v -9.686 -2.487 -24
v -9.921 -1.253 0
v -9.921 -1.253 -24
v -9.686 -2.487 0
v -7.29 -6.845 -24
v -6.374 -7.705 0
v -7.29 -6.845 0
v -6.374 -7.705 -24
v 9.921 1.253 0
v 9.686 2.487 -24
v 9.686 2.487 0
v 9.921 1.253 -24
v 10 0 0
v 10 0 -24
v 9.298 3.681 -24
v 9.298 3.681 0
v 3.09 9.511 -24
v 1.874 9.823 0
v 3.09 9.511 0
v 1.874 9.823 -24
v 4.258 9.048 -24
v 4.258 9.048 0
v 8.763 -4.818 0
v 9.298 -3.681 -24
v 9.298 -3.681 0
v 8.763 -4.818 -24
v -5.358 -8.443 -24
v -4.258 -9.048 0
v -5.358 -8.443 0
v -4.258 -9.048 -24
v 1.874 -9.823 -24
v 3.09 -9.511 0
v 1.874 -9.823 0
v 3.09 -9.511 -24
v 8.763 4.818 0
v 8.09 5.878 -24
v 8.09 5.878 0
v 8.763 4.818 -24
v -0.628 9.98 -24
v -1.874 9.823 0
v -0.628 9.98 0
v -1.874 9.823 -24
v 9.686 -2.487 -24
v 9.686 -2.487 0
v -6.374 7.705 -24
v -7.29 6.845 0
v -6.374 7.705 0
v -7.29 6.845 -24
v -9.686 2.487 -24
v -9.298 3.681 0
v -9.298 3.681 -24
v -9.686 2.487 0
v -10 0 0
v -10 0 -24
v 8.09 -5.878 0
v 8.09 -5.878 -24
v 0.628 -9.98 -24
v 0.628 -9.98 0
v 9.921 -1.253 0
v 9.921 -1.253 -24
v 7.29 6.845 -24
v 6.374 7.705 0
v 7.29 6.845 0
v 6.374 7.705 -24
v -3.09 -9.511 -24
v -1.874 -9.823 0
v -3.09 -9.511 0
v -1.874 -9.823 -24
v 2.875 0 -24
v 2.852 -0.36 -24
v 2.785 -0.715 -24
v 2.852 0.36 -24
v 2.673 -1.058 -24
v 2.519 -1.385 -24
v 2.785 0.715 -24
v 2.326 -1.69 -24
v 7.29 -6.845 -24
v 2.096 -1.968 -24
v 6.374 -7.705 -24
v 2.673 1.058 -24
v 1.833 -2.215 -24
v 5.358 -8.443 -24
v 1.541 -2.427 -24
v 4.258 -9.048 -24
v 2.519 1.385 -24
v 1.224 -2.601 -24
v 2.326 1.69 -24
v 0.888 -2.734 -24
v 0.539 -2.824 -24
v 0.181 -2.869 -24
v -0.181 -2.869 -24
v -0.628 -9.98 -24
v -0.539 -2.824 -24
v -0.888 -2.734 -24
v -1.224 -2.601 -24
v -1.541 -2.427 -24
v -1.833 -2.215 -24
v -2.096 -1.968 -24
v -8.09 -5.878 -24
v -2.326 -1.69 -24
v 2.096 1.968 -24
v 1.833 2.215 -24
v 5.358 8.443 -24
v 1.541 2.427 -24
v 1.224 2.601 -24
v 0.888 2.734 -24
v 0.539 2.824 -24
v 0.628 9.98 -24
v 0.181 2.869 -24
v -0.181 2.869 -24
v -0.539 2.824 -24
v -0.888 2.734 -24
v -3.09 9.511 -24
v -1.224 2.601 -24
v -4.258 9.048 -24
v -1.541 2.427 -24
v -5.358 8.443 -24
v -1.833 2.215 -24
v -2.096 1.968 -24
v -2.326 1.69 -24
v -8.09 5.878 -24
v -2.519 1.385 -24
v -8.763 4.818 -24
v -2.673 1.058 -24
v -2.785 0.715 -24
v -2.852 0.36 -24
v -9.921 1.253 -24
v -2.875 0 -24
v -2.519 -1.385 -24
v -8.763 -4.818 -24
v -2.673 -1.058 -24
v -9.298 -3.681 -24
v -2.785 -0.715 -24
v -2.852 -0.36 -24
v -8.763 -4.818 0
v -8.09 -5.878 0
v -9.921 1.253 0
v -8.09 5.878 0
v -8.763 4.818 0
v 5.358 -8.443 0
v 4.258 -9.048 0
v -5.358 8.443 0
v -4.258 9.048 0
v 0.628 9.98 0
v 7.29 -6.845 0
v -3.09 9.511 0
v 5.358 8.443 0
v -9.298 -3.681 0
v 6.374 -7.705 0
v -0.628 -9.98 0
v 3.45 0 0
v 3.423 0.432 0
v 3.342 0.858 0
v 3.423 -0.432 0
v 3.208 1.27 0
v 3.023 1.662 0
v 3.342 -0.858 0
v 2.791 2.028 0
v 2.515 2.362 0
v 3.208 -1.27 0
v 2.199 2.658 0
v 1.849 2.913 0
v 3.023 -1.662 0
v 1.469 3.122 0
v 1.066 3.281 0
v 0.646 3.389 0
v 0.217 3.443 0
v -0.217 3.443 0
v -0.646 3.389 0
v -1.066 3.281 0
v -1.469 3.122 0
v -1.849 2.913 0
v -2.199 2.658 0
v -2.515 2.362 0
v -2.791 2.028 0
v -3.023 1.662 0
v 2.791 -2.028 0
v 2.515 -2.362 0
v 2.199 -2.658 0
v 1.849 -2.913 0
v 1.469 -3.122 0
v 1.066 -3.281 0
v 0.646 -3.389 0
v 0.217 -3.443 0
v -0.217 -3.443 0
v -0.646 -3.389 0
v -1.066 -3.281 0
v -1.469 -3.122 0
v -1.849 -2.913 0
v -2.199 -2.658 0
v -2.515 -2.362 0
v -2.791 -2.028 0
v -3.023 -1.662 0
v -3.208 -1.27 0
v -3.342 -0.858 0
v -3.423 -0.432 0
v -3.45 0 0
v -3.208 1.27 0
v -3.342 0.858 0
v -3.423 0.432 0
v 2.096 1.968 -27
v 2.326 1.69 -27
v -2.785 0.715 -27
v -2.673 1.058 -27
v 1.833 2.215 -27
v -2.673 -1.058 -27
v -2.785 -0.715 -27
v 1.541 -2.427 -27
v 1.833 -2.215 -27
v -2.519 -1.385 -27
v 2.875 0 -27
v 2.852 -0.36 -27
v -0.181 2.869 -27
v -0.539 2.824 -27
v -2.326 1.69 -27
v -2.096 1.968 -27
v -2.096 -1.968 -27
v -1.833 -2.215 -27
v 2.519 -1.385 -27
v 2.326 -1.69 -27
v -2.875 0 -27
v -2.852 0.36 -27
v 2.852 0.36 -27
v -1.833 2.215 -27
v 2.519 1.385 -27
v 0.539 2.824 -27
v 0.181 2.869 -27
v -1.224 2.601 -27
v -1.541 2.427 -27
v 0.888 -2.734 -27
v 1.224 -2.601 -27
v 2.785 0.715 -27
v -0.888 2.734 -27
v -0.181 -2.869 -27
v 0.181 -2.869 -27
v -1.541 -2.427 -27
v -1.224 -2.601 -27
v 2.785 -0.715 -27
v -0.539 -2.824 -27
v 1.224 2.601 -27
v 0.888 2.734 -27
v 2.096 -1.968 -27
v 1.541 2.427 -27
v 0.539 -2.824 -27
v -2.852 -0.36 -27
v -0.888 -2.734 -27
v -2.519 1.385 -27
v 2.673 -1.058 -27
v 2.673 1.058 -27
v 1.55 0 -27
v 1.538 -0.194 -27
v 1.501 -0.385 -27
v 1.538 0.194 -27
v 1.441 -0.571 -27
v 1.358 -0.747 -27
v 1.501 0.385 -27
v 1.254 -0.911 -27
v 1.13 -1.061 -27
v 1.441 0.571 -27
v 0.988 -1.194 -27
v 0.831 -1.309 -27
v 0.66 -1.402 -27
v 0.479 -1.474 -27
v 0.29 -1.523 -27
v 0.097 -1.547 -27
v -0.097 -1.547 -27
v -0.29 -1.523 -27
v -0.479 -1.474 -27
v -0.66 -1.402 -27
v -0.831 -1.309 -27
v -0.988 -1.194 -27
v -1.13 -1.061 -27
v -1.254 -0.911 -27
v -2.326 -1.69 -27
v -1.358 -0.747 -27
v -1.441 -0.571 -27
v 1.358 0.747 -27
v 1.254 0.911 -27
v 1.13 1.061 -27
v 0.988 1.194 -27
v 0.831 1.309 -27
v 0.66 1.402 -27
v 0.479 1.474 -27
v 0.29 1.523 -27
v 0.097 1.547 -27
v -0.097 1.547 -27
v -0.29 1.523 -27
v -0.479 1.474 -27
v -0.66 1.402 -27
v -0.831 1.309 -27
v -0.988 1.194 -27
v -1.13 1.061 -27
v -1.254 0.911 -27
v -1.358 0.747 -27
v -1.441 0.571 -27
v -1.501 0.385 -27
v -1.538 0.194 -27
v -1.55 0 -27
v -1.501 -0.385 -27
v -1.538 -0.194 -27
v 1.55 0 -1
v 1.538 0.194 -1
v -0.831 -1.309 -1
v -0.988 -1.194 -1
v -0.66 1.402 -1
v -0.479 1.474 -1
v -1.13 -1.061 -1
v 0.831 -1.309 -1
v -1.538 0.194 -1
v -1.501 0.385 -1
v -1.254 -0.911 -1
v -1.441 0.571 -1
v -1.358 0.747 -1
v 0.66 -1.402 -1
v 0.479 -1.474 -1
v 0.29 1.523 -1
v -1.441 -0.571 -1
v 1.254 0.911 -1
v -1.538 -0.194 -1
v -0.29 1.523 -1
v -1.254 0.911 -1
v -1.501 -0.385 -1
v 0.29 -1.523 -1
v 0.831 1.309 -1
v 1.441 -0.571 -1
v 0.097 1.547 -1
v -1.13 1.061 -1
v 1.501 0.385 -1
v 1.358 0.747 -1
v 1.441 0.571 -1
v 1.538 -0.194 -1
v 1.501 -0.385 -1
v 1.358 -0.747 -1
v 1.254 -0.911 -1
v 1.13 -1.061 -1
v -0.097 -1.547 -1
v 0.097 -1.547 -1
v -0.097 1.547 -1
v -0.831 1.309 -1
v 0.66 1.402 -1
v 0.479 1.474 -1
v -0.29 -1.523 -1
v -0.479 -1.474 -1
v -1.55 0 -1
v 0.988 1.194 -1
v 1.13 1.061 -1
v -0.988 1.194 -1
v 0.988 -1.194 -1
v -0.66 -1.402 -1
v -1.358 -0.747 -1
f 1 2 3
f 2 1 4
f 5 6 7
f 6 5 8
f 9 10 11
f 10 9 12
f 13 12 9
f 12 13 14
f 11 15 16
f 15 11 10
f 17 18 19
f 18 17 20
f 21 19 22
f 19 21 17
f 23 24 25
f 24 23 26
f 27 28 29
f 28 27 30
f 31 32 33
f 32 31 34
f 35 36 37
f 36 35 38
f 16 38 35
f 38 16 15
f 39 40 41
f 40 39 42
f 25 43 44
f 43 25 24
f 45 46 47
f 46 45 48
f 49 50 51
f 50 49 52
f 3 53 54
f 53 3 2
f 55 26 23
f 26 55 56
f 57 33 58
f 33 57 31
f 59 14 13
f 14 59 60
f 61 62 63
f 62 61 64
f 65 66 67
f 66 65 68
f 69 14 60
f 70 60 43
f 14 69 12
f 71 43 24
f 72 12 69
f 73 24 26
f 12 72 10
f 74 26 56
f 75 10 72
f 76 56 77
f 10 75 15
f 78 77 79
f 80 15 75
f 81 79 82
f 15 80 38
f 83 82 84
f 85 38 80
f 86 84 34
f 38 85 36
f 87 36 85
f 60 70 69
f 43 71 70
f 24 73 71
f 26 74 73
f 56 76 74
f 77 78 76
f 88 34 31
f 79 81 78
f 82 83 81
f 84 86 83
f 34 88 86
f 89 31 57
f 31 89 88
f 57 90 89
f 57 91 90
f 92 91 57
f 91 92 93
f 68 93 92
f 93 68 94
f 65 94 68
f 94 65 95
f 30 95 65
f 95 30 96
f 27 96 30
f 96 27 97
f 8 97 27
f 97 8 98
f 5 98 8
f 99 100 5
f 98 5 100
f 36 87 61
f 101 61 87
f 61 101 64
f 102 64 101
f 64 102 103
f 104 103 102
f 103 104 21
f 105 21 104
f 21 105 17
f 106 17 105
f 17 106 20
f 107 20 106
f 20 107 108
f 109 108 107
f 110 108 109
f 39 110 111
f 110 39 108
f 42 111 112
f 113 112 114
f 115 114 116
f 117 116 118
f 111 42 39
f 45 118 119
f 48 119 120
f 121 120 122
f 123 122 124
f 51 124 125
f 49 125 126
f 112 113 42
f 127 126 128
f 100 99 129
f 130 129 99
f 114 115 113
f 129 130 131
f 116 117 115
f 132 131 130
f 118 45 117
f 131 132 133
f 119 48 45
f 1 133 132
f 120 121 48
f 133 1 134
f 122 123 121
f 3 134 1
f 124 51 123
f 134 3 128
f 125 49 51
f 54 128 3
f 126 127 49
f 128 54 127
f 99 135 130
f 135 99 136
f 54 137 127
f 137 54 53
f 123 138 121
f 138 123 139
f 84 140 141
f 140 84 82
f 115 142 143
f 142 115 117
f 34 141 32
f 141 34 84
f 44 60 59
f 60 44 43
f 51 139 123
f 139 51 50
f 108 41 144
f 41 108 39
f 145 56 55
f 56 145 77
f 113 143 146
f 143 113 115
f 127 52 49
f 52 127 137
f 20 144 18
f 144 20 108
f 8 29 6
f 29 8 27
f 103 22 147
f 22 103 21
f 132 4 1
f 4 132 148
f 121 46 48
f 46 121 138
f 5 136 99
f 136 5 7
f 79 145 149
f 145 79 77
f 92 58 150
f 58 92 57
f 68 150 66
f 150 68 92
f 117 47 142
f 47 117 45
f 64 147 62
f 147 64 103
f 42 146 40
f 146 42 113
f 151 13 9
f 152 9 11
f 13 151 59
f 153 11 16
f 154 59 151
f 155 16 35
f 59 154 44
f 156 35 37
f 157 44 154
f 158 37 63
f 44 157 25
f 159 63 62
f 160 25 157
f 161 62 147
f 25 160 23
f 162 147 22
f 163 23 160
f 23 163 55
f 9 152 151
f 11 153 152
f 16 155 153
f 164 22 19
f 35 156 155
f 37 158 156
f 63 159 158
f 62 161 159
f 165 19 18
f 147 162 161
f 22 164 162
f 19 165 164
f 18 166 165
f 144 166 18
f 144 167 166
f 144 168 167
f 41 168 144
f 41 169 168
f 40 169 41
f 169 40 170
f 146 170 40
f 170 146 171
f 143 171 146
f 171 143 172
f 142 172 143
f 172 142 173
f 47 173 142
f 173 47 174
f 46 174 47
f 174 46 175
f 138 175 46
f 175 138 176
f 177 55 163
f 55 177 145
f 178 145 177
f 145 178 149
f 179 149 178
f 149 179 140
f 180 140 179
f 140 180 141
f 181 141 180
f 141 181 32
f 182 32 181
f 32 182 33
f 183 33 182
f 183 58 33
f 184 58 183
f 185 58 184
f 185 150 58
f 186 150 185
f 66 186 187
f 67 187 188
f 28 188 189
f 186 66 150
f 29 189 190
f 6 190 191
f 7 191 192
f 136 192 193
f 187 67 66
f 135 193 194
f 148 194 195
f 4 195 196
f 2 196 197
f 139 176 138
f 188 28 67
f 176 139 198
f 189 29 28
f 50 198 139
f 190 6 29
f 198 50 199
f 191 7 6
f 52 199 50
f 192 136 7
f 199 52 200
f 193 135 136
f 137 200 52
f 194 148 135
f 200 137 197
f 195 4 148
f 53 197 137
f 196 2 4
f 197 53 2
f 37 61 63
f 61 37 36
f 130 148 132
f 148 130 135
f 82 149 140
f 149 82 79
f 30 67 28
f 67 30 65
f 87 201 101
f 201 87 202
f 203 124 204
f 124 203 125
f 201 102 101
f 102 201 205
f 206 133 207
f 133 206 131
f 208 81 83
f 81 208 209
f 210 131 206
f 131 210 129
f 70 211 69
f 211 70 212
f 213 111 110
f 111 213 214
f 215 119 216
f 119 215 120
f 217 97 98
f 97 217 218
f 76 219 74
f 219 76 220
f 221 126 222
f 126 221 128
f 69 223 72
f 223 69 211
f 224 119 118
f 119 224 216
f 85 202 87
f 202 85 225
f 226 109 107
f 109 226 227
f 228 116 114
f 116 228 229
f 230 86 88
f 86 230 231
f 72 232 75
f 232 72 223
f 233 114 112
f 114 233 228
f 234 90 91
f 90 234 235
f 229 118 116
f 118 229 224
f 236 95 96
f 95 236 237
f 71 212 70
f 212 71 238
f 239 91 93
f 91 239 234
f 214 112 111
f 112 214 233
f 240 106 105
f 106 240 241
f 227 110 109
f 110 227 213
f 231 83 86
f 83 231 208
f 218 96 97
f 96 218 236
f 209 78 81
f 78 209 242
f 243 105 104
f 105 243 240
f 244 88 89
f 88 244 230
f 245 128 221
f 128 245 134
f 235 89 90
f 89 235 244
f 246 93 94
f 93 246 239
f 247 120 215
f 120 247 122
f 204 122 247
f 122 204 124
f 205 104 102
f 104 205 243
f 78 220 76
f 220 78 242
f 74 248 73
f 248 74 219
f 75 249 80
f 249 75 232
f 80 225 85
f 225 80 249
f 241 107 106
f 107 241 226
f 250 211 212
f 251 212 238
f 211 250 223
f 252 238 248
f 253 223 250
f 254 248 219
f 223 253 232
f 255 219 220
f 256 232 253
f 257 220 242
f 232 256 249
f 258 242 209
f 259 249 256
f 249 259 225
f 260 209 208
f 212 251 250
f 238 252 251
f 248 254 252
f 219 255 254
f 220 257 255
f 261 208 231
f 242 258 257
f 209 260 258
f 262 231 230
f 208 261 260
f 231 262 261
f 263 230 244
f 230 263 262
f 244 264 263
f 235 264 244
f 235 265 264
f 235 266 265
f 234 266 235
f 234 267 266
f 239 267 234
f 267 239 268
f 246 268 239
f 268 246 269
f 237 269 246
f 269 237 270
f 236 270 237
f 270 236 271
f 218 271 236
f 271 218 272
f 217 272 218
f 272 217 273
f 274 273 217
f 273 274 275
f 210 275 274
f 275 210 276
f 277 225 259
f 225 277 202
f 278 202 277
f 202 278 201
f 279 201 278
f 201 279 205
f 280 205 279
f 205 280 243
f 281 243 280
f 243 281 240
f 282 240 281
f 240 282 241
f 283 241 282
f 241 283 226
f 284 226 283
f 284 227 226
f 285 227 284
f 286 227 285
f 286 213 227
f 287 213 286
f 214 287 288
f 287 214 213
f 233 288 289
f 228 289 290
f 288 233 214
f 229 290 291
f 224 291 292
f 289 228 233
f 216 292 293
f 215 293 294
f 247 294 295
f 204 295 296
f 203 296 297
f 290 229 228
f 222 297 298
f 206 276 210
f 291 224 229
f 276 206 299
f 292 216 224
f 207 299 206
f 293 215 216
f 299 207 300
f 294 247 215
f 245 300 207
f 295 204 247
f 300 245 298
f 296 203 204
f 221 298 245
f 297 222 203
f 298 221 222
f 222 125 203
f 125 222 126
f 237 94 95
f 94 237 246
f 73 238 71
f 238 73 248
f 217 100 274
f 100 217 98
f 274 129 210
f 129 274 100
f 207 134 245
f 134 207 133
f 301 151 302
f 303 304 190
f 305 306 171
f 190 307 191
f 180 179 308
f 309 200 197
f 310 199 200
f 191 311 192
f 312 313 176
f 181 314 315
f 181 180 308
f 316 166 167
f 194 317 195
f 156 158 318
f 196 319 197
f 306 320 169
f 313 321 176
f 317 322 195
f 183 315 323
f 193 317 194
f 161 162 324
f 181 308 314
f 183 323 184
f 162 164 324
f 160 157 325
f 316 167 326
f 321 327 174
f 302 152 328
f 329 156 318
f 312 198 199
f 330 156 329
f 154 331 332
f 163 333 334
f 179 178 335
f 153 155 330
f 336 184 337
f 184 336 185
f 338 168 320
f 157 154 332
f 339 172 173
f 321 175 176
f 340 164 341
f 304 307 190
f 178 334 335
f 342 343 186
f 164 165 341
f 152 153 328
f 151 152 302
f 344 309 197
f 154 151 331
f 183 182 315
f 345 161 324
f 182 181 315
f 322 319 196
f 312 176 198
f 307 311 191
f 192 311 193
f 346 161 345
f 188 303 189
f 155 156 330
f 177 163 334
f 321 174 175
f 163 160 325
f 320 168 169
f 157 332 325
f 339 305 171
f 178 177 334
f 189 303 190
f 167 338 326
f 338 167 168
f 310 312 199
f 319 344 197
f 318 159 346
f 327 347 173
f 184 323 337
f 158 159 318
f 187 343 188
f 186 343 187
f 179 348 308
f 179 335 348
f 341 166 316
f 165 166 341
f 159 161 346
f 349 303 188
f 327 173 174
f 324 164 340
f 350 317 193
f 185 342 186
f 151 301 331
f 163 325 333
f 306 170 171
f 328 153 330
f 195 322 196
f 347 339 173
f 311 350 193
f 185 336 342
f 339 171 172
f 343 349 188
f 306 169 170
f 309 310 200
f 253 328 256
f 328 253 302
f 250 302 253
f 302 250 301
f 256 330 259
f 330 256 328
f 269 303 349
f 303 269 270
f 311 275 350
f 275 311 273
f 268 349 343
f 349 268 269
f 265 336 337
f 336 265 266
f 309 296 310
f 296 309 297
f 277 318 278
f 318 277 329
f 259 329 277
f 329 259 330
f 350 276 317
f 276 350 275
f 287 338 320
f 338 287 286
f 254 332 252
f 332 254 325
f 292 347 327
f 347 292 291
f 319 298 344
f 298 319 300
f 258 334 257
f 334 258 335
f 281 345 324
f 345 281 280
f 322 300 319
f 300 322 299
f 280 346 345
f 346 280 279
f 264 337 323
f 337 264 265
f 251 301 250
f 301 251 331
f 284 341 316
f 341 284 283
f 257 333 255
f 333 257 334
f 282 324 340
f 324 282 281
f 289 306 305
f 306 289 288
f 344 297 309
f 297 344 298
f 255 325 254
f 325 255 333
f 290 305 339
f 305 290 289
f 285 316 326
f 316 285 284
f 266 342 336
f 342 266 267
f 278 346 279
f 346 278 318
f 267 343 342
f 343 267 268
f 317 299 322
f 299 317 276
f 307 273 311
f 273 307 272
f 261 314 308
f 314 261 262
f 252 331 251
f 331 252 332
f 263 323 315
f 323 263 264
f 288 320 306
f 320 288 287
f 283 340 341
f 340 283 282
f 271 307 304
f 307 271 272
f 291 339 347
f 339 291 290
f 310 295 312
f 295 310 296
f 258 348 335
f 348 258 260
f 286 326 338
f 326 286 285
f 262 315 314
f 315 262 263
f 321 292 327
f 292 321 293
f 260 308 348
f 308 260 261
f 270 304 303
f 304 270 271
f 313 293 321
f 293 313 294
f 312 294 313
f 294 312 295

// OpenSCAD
$fn = 50;


difference() {
	union() {
		translate(v = [0, 0, -24.0000000000]) {
			cylinder(h = 24, r = 10.0000000000);
		}
		#translate(v = [0, 0, -27.0000000000]) {
			cylinder(h = 27, r = 2.8750000000);
		}
	}
	union() {
		translate(v = [0, 0, 0]) {
			rotate(a = [0, 0, 0]) {
				difference() {
					union() {
						translate(v = [0, 0, -27.0000000000]) {
							cylinder(h = 27, r = 1.2500000000);
						}
						translate(v = [0, 0, -1.0000000000]) {
							cylinder(h = 1.0000000000, r1 = 1.5500000000, r2 = 3.4500000000);
						}
						translate(v = [0, 0, -27.0000000000]) {
							cylinder(h = 27, r = 1.5500000000);
						}
						translate(v = [0, 0, -27.0000000000]) {
							cylinder(h = 27, r = 1.2500000000);
						}
					}
					union();
				}
			}
		}
	}
}
